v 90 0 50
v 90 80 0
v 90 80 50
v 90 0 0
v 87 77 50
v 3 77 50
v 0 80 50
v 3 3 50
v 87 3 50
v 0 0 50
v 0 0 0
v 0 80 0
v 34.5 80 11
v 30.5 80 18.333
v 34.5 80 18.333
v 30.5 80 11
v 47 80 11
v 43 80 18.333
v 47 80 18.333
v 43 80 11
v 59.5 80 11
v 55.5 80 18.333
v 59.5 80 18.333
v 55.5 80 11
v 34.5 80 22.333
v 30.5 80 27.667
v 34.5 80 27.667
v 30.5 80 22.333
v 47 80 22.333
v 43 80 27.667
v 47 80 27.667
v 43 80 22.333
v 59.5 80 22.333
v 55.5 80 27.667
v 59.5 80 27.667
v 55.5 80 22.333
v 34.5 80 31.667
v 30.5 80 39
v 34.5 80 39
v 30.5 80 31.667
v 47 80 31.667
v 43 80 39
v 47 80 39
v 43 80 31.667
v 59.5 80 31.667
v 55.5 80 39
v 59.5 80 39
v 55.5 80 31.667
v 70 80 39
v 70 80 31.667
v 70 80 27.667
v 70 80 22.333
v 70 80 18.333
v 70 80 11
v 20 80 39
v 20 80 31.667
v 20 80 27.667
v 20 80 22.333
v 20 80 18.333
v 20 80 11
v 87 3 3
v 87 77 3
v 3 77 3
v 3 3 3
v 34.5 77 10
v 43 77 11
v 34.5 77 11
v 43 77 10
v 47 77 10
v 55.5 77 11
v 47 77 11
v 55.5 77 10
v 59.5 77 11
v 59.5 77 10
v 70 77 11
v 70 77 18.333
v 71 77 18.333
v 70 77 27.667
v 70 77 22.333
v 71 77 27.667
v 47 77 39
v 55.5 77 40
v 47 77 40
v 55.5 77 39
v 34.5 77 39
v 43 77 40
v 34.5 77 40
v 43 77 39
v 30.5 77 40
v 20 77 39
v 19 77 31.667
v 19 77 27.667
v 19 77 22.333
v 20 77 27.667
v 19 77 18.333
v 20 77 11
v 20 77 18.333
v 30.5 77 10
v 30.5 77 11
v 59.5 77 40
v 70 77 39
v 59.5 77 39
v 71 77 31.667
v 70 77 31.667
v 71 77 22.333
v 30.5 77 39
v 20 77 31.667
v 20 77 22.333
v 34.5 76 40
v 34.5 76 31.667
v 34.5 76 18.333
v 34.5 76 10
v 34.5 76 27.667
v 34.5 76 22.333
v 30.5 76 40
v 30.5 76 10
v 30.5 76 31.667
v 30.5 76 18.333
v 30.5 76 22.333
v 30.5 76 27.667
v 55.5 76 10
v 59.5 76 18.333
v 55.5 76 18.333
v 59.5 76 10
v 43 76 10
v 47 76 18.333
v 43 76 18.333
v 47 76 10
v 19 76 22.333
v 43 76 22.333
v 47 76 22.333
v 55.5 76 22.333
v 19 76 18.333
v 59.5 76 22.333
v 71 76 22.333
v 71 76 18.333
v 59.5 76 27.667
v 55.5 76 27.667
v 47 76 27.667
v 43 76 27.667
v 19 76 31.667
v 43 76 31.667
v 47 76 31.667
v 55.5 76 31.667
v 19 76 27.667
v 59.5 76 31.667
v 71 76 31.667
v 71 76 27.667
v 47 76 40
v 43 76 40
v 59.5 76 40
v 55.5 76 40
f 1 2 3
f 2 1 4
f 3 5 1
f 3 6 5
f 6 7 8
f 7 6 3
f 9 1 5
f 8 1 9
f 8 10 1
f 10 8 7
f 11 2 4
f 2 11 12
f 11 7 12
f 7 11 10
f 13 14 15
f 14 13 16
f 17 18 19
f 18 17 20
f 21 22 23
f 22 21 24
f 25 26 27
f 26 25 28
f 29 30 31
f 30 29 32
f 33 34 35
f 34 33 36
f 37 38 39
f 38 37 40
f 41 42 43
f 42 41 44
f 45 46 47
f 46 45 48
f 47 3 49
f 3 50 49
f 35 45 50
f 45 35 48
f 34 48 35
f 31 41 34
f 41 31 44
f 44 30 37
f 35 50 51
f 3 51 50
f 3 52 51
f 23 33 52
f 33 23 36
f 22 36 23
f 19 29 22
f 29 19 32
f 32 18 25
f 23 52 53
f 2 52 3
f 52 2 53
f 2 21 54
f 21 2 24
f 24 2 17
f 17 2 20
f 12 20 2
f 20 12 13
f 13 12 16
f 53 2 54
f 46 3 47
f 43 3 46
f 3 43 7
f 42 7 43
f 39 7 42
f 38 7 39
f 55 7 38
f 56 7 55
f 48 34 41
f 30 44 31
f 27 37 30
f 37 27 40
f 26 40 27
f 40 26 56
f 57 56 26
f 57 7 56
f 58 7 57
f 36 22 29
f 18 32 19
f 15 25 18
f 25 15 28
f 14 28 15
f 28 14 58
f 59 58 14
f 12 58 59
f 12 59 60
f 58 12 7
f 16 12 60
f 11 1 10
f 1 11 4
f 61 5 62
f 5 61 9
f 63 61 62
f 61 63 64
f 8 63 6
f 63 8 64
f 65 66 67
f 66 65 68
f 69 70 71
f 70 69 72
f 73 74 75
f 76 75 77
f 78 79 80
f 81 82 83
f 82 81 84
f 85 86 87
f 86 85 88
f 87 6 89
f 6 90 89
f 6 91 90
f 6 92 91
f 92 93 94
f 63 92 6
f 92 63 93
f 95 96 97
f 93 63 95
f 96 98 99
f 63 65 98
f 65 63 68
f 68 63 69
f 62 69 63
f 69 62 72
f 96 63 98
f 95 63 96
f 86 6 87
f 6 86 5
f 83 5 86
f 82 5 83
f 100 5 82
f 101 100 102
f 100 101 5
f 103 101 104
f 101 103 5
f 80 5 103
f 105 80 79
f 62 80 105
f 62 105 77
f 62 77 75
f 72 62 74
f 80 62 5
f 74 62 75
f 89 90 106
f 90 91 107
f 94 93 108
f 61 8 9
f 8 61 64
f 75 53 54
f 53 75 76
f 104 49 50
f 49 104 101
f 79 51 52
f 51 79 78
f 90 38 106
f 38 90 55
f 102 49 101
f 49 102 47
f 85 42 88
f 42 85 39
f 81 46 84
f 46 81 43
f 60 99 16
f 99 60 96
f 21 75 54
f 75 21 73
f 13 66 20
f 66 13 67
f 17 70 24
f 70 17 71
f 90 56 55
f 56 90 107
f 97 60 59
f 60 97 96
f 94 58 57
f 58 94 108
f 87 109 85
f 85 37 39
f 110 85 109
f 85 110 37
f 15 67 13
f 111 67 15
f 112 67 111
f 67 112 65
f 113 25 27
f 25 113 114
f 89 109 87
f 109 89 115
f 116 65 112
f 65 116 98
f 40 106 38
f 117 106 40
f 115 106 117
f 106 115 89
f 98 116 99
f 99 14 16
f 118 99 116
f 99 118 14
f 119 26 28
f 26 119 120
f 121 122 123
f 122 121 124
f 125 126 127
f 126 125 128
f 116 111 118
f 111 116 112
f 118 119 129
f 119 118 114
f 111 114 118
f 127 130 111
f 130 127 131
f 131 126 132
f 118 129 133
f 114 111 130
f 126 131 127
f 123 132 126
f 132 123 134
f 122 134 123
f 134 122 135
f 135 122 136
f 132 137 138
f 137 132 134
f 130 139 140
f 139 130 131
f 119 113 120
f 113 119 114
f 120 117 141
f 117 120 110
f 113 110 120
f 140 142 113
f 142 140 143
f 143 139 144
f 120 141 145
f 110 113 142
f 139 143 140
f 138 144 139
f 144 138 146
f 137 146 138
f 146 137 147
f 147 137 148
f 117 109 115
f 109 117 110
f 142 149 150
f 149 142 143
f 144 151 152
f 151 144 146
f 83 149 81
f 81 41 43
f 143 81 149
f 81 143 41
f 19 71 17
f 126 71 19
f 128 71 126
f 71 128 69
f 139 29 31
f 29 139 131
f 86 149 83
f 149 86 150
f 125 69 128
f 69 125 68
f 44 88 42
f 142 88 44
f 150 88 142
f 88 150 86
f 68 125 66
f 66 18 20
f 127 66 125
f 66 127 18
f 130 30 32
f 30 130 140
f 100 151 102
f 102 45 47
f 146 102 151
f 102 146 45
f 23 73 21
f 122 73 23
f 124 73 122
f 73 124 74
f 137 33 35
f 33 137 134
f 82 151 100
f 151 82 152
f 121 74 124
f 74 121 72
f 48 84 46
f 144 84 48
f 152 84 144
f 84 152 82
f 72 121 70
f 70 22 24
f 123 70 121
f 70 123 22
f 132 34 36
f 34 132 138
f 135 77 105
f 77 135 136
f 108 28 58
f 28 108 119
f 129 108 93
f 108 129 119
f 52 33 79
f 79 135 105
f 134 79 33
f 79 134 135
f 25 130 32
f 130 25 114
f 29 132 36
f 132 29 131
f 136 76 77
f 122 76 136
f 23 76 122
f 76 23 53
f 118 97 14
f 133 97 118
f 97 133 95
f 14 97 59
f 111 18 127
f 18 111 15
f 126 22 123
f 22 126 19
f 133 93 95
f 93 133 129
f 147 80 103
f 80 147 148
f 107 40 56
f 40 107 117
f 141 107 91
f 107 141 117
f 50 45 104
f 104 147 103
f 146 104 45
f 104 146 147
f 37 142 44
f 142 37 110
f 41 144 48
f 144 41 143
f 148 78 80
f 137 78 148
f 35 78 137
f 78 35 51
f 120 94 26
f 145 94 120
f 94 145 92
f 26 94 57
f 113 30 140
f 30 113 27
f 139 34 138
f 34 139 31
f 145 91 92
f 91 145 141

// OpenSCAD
$fn = 32;

// ----------------------------------------------------------------------
// Vent box: crossgrid enclosure
// ----------------------------------------------------------------------

// --- parameters (mm) ---
box_l = 90;               // box length, X
box_w = 80;               // box width, Y
box_h = 50;               // box height, Z
wall_t = 3;               // shell wall thickness
win_l = 50;               // vent window width, X
win_h = 28;               // vent window height, Z
bar_w = 4;                // grid bar width
n_v = 3;                  // vertical bar count
n_h = 2;                  // horizontal bar count

win_z0 = (box_h - win_h) / 2;  // window lower edge Z
v_step = win_l / (n_v + 1);  // vertical bar step
h_step = win_h / (n_h + 1);  // horizontal bar step

difference() {
  union() {
    difference() {
      cube([box_l, box_w, box_h]);
  translate([wall_t, wall_t, wall_t])
    cube([box_l - 2 * wall_t, box_w - 2 * wall_t, box_h]);
  translate([(box_l - win_l) / 2, box_w - wall_t - 1, win_z0])
    cube([win_l, wall_t + 2, win_h]);
    }
    for (i = [1 : n_v])
      translate([(box_l - win_l) / 2 + i * v_step - bar_w / 2,
                 box_w - wall_t - 1, win_z0 - 1])
        cube([bar_w, wall_t + 1, win_h + 2]);
    for (i = [1 : n_h])
      translate([(box_l - win_l) / 2 - 1, box_w - wall_t - 1,
                 win_z0 + i * h_step - bar_w / 2])
        cube([win_l + 2, wall_t + 1, bar_w]);
  }
}
